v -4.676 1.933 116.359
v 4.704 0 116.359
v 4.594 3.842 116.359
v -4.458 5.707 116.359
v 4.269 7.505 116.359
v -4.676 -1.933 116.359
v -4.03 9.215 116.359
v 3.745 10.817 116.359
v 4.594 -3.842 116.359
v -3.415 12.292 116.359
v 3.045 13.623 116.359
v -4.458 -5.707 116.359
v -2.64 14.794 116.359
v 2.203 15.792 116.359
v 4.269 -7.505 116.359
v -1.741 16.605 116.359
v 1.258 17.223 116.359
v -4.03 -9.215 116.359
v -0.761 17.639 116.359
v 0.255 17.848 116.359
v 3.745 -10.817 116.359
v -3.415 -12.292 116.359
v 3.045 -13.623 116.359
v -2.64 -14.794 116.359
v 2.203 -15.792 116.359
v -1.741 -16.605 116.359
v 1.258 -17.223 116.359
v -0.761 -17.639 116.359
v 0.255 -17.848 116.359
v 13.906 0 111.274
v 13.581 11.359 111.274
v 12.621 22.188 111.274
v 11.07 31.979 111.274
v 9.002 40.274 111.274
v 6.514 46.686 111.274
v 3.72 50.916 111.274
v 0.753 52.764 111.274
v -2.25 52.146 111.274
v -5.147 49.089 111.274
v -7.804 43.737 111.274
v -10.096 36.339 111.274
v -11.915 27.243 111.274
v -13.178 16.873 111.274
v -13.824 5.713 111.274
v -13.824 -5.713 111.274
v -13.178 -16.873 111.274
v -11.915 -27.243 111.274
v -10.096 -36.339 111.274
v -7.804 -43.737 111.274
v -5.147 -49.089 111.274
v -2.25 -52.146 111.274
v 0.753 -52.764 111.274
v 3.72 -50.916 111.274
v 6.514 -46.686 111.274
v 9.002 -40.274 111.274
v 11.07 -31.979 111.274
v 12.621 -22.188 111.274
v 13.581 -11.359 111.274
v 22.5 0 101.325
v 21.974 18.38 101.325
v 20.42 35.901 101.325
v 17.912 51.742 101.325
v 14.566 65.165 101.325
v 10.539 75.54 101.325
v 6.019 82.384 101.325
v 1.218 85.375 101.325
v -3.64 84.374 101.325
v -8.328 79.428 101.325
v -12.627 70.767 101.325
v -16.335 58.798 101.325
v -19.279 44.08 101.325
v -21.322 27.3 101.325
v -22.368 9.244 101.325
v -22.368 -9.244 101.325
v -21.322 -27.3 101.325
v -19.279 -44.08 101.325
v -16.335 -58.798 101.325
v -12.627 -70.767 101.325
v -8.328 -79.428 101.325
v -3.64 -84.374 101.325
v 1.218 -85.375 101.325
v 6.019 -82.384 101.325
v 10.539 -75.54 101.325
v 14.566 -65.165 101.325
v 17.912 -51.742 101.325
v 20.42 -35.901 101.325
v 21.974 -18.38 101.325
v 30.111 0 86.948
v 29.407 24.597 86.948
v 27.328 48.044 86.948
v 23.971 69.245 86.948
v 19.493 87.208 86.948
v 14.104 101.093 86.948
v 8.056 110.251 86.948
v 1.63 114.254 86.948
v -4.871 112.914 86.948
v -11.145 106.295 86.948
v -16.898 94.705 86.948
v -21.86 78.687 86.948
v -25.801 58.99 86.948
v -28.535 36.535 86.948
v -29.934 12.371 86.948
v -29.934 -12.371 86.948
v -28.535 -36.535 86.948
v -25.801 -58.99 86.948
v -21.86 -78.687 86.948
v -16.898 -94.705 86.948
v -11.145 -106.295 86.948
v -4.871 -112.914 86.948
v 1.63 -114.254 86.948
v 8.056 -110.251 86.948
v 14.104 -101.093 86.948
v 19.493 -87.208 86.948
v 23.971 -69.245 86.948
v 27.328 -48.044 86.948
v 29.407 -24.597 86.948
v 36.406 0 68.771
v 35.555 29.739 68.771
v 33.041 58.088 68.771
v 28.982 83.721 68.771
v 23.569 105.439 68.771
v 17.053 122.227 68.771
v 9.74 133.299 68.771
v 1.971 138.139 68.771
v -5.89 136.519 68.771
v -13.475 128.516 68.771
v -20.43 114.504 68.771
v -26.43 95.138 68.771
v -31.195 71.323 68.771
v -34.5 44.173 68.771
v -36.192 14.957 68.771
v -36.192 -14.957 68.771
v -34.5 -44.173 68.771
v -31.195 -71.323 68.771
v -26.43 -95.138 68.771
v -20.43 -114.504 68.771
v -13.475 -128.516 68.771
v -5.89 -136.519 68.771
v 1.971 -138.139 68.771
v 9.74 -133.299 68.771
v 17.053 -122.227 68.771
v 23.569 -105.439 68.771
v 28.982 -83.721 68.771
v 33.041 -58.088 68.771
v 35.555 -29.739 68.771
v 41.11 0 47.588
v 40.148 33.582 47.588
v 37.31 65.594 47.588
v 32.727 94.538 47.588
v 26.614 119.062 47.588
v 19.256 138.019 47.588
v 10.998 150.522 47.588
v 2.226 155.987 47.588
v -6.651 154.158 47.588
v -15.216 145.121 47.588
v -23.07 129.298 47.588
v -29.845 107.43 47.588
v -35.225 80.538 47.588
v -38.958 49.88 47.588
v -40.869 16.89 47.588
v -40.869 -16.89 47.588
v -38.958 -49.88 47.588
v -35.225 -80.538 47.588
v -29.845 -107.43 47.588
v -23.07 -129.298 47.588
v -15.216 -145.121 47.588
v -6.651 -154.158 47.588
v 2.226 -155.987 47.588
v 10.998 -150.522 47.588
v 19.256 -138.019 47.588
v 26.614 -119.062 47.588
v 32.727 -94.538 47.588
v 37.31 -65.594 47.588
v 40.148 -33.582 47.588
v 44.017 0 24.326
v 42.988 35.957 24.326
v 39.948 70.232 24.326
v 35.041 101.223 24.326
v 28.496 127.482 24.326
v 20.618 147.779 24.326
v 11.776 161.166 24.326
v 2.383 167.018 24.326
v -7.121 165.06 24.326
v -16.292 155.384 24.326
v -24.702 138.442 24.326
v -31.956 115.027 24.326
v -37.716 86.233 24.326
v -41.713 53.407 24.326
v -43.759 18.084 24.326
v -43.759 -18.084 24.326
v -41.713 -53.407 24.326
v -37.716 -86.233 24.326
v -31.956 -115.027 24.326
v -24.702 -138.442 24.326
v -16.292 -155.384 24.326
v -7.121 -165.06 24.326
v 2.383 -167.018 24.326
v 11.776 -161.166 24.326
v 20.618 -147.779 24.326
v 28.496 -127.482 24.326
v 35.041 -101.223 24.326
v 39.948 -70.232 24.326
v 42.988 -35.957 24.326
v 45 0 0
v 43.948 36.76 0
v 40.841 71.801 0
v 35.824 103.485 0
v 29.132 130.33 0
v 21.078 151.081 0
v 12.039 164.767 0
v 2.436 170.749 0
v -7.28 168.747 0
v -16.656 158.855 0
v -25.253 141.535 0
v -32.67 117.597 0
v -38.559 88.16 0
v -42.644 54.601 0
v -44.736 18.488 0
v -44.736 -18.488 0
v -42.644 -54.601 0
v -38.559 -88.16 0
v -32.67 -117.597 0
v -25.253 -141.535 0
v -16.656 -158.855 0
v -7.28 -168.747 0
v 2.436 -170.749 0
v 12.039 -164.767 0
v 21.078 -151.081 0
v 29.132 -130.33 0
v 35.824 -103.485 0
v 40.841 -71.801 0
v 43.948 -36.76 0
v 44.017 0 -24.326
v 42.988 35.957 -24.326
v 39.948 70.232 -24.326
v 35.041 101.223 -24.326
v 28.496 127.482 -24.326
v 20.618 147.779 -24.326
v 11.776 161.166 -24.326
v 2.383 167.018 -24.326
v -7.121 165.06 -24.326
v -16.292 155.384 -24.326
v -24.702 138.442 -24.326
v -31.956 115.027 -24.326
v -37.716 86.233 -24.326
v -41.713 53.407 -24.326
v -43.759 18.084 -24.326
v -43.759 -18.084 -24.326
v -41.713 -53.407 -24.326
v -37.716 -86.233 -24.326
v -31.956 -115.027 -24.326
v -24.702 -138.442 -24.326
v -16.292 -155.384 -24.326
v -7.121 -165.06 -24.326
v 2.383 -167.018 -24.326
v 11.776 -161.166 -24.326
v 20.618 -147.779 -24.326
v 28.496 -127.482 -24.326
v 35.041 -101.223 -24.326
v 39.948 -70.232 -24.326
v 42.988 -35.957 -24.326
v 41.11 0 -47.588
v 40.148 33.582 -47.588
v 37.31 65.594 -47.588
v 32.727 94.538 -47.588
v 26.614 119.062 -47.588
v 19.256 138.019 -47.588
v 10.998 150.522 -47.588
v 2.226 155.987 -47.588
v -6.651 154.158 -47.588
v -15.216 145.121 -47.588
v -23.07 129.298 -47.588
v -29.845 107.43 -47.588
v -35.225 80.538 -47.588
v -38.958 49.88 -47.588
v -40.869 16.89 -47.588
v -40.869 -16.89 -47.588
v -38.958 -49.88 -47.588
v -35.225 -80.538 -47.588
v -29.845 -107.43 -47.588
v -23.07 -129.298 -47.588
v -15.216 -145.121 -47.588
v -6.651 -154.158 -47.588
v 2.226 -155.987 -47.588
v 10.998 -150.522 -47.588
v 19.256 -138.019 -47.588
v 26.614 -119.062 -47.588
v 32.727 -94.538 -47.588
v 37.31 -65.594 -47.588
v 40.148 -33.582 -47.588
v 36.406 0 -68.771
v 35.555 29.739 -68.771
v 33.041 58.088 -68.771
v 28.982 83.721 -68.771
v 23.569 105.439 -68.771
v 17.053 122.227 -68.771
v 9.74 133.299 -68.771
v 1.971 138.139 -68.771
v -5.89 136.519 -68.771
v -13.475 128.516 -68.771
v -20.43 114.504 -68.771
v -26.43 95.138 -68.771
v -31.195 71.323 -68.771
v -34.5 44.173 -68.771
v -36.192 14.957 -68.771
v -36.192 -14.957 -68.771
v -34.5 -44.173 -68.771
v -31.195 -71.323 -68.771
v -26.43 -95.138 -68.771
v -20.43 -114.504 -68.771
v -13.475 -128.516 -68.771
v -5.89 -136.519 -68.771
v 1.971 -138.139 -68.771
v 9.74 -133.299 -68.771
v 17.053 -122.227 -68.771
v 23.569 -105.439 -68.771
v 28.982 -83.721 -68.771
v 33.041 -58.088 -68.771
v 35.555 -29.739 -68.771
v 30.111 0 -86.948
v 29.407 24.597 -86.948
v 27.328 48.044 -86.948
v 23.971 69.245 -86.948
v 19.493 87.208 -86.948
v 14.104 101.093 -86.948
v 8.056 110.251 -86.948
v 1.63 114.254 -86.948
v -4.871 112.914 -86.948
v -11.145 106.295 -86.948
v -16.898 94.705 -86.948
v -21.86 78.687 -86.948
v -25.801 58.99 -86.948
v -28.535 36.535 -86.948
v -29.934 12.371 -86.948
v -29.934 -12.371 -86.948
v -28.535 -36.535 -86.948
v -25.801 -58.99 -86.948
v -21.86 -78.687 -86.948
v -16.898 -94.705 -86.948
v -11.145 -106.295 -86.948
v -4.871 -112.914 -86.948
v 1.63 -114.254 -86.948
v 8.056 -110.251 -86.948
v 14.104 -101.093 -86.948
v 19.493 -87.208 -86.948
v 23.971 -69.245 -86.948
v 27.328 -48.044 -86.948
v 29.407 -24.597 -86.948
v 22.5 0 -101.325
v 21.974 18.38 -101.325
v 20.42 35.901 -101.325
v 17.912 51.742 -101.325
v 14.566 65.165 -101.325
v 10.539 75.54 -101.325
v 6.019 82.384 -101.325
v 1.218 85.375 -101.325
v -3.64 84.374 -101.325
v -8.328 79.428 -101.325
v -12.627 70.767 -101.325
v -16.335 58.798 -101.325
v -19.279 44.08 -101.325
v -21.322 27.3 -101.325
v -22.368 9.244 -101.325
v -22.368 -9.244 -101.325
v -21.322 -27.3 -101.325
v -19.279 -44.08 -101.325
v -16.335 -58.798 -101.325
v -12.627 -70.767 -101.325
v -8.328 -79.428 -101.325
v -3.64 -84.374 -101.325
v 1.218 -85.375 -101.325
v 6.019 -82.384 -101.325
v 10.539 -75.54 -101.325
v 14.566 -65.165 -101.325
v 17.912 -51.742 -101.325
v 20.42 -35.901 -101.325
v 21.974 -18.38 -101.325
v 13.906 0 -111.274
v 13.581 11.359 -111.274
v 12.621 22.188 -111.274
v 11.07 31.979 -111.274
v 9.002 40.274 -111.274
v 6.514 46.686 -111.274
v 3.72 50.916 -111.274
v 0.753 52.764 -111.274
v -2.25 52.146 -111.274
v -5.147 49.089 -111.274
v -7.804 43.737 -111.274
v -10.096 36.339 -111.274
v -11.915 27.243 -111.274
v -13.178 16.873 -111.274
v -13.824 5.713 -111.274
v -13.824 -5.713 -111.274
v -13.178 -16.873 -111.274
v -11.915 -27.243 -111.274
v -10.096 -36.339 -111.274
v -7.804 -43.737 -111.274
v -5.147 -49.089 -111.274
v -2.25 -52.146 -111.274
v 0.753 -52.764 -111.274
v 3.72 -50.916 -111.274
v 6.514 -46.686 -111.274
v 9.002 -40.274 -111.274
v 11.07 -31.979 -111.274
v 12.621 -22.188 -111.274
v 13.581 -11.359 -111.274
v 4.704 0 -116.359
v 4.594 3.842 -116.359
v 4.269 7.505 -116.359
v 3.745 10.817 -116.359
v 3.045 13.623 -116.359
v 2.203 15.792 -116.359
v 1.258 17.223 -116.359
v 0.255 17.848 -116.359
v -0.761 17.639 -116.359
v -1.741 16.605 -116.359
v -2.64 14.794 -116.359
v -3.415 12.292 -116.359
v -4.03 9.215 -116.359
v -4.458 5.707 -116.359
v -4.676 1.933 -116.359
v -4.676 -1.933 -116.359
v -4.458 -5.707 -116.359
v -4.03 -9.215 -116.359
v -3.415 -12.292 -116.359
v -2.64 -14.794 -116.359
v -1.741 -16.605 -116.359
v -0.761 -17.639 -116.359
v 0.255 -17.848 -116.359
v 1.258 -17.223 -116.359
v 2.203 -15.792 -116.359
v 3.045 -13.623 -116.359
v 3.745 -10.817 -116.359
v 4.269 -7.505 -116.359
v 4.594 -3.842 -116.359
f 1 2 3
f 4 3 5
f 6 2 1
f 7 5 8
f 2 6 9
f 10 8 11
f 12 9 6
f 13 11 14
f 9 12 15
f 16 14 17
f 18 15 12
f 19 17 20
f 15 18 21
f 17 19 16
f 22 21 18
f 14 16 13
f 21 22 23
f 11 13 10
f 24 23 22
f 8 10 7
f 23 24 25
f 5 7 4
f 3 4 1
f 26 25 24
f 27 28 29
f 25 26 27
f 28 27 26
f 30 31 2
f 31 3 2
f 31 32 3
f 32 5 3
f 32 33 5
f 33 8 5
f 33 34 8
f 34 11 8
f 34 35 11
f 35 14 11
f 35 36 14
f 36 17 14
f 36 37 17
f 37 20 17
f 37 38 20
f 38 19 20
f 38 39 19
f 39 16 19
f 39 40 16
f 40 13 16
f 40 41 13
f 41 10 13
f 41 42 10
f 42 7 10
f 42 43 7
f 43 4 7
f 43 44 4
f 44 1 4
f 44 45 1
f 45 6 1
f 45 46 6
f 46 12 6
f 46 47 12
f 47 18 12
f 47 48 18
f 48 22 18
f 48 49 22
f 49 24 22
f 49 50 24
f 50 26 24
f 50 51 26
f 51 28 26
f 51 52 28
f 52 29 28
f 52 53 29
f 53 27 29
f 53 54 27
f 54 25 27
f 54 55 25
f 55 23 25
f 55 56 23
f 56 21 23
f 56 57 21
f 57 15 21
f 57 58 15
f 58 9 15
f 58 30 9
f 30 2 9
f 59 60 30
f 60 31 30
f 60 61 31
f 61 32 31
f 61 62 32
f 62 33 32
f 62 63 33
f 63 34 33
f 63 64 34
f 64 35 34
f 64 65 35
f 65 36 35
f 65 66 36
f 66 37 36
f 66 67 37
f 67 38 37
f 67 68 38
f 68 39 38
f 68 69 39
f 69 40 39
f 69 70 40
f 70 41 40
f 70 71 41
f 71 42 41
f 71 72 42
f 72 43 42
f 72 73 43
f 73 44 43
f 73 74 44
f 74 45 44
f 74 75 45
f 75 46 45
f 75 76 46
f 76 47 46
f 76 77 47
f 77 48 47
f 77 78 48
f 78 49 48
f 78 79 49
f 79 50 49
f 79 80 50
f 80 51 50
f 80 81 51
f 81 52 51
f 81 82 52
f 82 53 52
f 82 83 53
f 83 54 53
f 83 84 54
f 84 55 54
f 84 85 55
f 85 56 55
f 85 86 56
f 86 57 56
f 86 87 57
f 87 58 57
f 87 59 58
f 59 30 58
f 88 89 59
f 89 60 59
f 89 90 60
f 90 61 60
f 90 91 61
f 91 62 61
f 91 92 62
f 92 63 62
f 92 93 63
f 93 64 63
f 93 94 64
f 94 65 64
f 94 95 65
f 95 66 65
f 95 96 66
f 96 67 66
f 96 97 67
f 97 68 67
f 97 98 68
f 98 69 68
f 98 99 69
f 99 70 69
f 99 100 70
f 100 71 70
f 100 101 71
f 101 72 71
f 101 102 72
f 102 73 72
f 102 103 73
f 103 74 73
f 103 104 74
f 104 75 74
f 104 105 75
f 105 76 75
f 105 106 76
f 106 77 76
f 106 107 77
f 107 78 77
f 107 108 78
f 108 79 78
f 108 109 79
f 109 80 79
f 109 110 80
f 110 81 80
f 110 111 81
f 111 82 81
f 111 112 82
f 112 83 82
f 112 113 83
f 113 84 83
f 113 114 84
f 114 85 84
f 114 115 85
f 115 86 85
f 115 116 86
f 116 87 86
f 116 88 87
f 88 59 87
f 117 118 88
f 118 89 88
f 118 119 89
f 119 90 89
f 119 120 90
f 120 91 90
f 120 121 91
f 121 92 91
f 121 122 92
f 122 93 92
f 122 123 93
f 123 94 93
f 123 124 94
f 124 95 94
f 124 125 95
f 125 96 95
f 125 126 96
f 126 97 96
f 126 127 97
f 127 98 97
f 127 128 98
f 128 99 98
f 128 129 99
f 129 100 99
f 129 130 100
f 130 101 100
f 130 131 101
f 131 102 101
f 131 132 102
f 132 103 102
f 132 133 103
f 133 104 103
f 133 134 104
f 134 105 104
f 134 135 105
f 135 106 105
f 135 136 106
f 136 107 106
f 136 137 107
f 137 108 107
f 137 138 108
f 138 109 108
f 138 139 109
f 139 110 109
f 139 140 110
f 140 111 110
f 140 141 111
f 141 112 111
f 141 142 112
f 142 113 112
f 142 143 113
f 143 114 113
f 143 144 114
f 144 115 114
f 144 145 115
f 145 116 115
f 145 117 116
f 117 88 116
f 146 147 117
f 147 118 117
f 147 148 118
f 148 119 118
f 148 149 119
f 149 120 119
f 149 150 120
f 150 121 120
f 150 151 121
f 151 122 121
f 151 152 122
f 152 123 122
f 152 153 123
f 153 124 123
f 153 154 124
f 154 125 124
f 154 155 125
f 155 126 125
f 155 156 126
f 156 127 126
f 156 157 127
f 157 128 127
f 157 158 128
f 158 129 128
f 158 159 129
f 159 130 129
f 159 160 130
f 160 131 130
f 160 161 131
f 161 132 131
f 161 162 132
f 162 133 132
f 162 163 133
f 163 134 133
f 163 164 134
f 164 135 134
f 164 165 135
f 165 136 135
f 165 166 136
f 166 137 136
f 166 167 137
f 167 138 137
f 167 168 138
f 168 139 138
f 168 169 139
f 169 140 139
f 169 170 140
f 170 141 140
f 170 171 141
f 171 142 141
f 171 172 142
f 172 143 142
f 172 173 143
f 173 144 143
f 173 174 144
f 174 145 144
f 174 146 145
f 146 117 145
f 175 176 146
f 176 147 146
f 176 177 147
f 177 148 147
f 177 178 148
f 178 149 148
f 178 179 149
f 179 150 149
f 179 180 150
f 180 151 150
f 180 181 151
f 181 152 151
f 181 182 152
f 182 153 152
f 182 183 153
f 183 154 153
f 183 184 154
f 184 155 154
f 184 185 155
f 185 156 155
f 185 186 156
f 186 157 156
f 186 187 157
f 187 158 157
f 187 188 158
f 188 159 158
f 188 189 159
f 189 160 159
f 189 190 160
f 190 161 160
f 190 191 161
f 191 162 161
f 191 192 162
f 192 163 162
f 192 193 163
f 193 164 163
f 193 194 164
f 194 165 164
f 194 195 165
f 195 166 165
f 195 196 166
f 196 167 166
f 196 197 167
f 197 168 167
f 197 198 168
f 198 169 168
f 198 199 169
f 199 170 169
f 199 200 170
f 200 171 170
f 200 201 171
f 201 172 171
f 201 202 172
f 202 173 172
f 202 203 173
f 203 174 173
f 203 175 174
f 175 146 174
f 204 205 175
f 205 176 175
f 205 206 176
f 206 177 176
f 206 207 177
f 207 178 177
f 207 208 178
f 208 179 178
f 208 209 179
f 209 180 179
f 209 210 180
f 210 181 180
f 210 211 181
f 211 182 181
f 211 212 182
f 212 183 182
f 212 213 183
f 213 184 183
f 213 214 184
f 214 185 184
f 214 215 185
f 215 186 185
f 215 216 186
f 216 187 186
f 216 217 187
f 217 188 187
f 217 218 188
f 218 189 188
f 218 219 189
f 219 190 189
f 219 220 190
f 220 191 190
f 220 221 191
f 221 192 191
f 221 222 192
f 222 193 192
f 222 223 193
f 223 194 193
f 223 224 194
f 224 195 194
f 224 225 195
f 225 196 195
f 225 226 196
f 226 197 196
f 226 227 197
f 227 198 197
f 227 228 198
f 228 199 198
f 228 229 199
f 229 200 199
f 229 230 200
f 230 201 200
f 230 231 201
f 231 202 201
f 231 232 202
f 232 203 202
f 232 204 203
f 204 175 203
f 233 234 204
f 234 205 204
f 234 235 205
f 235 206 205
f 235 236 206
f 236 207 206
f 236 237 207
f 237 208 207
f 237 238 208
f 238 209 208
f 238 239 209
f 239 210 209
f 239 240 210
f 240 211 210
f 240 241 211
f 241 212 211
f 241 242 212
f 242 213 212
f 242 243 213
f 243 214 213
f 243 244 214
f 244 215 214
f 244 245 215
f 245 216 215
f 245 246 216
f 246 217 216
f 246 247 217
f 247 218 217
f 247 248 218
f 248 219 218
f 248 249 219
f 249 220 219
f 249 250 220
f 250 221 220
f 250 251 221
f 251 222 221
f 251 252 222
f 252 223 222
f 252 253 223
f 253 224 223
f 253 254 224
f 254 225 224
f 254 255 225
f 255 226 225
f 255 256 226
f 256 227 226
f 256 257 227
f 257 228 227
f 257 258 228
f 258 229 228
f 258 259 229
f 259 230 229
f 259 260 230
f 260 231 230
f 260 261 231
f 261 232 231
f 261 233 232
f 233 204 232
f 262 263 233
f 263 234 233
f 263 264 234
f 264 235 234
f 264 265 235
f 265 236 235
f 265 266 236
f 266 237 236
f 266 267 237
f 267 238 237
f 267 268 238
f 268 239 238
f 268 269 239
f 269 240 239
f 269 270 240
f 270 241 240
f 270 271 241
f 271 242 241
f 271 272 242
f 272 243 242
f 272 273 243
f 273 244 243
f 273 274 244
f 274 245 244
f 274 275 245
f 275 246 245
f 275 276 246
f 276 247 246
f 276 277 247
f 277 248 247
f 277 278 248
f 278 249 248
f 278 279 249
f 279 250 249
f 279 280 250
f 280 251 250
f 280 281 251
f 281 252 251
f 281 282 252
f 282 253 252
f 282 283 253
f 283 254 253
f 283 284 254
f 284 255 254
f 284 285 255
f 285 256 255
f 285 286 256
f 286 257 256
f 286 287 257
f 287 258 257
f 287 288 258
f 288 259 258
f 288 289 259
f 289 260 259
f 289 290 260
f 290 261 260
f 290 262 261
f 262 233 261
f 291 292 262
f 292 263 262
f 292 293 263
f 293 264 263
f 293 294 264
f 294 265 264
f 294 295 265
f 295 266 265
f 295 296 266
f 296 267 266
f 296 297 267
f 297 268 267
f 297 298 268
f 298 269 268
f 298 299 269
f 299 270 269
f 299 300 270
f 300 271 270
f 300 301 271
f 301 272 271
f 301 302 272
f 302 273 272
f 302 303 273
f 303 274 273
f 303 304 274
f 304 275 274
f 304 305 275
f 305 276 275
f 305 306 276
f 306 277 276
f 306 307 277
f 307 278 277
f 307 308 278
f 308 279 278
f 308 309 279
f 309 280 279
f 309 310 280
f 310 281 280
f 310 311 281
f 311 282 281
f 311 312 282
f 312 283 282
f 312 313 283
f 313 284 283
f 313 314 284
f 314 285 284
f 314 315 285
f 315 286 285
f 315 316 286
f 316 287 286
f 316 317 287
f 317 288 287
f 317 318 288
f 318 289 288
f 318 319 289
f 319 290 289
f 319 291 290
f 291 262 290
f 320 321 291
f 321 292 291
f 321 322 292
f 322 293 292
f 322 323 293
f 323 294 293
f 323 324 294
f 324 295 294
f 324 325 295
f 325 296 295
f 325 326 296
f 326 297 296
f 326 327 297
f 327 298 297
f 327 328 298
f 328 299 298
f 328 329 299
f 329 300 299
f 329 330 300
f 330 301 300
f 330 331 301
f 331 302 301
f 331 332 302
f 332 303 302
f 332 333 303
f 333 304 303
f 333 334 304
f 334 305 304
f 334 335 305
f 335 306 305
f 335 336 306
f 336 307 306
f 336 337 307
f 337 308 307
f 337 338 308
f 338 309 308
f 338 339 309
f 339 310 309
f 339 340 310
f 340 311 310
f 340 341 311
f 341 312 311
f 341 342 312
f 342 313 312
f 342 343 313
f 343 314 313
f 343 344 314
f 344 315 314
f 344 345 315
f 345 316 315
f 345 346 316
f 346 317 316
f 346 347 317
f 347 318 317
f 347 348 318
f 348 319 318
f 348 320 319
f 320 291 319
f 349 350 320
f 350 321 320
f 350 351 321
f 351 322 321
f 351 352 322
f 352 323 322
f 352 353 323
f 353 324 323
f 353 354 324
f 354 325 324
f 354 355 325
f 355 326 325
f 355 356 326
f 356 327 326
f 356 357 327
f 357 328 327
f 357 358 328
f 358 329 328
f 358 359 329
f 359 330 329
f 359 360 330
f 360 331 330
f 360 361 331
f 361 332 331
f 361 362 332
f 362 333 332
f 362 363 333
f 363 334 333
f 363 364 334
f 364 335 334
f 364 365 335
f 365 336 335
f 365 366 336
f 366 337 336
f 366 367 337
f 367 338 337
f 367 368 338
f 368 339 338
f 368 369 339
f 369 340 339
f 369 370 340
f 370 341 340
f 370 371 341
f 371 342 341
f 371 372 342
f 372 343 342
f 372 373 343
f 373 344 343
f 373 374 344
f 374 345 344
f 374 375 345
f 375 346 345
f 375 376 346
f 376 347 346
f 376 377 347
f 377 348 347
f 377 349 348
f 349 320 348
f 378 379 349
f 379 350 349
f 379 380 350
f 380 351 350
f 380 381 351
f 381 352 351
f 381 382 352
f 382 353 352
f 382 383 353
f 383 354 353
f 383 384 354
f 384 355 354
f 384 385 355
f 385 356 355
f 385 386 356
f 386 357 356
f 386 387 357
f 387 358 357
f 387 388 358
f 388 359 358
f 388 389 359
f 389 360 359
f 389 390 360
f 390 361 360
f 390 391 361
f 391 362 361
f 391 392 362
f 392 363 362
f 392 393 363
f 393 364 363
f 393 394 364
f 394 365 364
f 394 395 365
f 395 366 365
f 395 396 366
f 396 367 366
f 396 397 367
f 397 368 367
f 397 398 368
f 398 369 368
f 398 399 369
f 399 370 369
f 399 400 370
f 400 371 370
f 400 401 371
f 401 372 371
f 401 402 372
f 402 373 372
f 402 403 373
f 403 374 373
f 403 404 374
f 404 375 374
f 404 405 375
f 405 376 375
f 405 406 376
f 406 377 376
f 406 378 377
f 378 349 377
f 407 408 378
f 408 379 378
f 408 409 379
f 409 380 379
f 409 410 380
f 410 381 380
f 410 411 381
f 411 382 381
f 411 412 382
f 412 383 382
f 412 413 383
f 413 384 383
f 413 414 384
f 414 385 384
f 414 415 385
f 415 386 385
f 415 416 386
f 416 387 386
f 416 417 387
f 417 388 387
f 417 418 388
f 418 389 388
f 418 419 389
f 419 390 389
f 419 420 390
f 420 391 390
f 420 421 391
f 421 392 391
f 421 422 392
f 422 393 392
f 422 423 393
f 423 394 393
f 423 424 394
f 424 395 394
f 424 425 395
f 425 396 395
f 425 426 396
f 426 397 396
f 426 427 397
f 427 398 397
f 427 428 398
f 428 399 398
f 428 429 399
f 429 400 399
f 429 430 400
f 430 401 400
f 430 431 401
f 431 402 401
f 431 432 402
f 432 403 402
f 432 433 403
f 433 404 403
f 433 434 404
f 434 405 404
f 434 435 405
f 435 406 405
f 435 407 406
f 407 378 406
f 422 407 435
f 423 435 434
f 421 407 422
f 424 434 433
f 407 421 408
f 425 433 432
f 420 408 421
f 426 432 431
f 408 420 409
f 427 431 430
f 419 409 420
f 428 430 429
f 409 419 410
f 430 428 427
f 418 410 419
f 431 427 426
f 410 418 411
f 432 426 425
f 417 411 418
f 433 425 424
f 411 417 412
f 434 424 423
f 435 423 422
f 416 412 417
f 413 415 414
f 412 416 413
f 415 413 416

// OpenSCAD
// Generated by SolidPython 1.0.1 on 2020-07-29 00:46:47


scale(v = [5, 19, 13]) {
	sphere(r = 9);
}
/***********************************************
*********      SolidPython code:      **********
************************************************
 
# import packages: SolidPython
from solid import *
from solid.utils import *
from itertools import chain, combinations, permutations


class Resize:

    def __init__(self, scad_file):
        self.scad_file = scad_file
        #self.scad_file = import_scad(scad_file)
        # cone/cylinder param:
        self.r1 = 0
        self.r2 = 0
        self.h = 0
        # rectangular prism param:
        self.w = 0
        self.l = 0
        # ellipse param:
        self.r = 0

    # import OpenScad code (file name corresponds to shape)


    # classify shape + parameters
    def assign(self, param1, param2, param3):
        if self.scad_file == 'cone.scad':
            self.r1 = param1
            self.r2 = param2
            self.h = param3
        elif self.scad_file == 'cylinder.scad':
            self.r1 = param1
            self.r2 = param2
            self.h = param3
        elif self.scad_file == 'rectangularPrism.scad':
            self.h = param1
            self.l = param2
            self.w = param3
        else:
            self.r = param1
            self.h = param2

    # resize parameters
    def iterate(self):
        x = range(3, 20, 2)
        i = 1
        if self.scad_file == 'cone.scad':
            tempList = list(permutations(x, 2))
            for temp in tempList:
                param1 = temp[0]
                param2 = temp[1]
                filepath = 'produced_scad_files/' + 'cone' + str(param1) + '_' + str(param2) + '_' + '.scad'
                scad_render_to_file(cylinder(h=param1, r1=param2, r2=0), filepath)

        elif self.scad_file == 'cylinder.scad':
            tempList = list(permutations(x, 3))
            for temp in tempList:
                param1 = temp[0]
                param2 = temp[1]
                filepath = 'produced_scad_files/' + 'cylinder' + str(param1) + '_' + str(param2) + '_' + '.scad'
                scad_render_to_file(cylinder(h=param1, r1=param2, r2=param2), filepath)

        elif self.scad_file == 'rectangularPrism.scad':
            tempList = list(permutations(x, 3))
            for temp in tempList:
                param1 = temp[0]
                param2 = temp[1]
                param3 = temp[2]
                filepath = 'produced_scad_files/' + 'rectangularPrism' + str(param1) + '_' + str(param2) + '_' + str(
                    param3) + '.scad'
                scad_render_to_file(cube(size=(param1, param2, param3)), filepath)

        elif self.scad_file == 'ellipse.scad':
            tempList = list(permutations(x, 4))
            for temp in tempList:
                param1 = temp[0]
                param2 = temp[1]
                param3 = temp[2]
                param4 = temp[3]
                filepath = 'produced_scad_files/' + 'ellipse' + str(param1) + '_' + str(param2) + '_' + str(param3) + '_' + str(param4) + '.scad'
                scad_render_to_file(scale([param1, param2, param3])(sphere(r=param4)), filepath)

    def render_to_scadfile(self):
        scad_render_to_file(scad, 'example.scad') 
 
************************************************/
